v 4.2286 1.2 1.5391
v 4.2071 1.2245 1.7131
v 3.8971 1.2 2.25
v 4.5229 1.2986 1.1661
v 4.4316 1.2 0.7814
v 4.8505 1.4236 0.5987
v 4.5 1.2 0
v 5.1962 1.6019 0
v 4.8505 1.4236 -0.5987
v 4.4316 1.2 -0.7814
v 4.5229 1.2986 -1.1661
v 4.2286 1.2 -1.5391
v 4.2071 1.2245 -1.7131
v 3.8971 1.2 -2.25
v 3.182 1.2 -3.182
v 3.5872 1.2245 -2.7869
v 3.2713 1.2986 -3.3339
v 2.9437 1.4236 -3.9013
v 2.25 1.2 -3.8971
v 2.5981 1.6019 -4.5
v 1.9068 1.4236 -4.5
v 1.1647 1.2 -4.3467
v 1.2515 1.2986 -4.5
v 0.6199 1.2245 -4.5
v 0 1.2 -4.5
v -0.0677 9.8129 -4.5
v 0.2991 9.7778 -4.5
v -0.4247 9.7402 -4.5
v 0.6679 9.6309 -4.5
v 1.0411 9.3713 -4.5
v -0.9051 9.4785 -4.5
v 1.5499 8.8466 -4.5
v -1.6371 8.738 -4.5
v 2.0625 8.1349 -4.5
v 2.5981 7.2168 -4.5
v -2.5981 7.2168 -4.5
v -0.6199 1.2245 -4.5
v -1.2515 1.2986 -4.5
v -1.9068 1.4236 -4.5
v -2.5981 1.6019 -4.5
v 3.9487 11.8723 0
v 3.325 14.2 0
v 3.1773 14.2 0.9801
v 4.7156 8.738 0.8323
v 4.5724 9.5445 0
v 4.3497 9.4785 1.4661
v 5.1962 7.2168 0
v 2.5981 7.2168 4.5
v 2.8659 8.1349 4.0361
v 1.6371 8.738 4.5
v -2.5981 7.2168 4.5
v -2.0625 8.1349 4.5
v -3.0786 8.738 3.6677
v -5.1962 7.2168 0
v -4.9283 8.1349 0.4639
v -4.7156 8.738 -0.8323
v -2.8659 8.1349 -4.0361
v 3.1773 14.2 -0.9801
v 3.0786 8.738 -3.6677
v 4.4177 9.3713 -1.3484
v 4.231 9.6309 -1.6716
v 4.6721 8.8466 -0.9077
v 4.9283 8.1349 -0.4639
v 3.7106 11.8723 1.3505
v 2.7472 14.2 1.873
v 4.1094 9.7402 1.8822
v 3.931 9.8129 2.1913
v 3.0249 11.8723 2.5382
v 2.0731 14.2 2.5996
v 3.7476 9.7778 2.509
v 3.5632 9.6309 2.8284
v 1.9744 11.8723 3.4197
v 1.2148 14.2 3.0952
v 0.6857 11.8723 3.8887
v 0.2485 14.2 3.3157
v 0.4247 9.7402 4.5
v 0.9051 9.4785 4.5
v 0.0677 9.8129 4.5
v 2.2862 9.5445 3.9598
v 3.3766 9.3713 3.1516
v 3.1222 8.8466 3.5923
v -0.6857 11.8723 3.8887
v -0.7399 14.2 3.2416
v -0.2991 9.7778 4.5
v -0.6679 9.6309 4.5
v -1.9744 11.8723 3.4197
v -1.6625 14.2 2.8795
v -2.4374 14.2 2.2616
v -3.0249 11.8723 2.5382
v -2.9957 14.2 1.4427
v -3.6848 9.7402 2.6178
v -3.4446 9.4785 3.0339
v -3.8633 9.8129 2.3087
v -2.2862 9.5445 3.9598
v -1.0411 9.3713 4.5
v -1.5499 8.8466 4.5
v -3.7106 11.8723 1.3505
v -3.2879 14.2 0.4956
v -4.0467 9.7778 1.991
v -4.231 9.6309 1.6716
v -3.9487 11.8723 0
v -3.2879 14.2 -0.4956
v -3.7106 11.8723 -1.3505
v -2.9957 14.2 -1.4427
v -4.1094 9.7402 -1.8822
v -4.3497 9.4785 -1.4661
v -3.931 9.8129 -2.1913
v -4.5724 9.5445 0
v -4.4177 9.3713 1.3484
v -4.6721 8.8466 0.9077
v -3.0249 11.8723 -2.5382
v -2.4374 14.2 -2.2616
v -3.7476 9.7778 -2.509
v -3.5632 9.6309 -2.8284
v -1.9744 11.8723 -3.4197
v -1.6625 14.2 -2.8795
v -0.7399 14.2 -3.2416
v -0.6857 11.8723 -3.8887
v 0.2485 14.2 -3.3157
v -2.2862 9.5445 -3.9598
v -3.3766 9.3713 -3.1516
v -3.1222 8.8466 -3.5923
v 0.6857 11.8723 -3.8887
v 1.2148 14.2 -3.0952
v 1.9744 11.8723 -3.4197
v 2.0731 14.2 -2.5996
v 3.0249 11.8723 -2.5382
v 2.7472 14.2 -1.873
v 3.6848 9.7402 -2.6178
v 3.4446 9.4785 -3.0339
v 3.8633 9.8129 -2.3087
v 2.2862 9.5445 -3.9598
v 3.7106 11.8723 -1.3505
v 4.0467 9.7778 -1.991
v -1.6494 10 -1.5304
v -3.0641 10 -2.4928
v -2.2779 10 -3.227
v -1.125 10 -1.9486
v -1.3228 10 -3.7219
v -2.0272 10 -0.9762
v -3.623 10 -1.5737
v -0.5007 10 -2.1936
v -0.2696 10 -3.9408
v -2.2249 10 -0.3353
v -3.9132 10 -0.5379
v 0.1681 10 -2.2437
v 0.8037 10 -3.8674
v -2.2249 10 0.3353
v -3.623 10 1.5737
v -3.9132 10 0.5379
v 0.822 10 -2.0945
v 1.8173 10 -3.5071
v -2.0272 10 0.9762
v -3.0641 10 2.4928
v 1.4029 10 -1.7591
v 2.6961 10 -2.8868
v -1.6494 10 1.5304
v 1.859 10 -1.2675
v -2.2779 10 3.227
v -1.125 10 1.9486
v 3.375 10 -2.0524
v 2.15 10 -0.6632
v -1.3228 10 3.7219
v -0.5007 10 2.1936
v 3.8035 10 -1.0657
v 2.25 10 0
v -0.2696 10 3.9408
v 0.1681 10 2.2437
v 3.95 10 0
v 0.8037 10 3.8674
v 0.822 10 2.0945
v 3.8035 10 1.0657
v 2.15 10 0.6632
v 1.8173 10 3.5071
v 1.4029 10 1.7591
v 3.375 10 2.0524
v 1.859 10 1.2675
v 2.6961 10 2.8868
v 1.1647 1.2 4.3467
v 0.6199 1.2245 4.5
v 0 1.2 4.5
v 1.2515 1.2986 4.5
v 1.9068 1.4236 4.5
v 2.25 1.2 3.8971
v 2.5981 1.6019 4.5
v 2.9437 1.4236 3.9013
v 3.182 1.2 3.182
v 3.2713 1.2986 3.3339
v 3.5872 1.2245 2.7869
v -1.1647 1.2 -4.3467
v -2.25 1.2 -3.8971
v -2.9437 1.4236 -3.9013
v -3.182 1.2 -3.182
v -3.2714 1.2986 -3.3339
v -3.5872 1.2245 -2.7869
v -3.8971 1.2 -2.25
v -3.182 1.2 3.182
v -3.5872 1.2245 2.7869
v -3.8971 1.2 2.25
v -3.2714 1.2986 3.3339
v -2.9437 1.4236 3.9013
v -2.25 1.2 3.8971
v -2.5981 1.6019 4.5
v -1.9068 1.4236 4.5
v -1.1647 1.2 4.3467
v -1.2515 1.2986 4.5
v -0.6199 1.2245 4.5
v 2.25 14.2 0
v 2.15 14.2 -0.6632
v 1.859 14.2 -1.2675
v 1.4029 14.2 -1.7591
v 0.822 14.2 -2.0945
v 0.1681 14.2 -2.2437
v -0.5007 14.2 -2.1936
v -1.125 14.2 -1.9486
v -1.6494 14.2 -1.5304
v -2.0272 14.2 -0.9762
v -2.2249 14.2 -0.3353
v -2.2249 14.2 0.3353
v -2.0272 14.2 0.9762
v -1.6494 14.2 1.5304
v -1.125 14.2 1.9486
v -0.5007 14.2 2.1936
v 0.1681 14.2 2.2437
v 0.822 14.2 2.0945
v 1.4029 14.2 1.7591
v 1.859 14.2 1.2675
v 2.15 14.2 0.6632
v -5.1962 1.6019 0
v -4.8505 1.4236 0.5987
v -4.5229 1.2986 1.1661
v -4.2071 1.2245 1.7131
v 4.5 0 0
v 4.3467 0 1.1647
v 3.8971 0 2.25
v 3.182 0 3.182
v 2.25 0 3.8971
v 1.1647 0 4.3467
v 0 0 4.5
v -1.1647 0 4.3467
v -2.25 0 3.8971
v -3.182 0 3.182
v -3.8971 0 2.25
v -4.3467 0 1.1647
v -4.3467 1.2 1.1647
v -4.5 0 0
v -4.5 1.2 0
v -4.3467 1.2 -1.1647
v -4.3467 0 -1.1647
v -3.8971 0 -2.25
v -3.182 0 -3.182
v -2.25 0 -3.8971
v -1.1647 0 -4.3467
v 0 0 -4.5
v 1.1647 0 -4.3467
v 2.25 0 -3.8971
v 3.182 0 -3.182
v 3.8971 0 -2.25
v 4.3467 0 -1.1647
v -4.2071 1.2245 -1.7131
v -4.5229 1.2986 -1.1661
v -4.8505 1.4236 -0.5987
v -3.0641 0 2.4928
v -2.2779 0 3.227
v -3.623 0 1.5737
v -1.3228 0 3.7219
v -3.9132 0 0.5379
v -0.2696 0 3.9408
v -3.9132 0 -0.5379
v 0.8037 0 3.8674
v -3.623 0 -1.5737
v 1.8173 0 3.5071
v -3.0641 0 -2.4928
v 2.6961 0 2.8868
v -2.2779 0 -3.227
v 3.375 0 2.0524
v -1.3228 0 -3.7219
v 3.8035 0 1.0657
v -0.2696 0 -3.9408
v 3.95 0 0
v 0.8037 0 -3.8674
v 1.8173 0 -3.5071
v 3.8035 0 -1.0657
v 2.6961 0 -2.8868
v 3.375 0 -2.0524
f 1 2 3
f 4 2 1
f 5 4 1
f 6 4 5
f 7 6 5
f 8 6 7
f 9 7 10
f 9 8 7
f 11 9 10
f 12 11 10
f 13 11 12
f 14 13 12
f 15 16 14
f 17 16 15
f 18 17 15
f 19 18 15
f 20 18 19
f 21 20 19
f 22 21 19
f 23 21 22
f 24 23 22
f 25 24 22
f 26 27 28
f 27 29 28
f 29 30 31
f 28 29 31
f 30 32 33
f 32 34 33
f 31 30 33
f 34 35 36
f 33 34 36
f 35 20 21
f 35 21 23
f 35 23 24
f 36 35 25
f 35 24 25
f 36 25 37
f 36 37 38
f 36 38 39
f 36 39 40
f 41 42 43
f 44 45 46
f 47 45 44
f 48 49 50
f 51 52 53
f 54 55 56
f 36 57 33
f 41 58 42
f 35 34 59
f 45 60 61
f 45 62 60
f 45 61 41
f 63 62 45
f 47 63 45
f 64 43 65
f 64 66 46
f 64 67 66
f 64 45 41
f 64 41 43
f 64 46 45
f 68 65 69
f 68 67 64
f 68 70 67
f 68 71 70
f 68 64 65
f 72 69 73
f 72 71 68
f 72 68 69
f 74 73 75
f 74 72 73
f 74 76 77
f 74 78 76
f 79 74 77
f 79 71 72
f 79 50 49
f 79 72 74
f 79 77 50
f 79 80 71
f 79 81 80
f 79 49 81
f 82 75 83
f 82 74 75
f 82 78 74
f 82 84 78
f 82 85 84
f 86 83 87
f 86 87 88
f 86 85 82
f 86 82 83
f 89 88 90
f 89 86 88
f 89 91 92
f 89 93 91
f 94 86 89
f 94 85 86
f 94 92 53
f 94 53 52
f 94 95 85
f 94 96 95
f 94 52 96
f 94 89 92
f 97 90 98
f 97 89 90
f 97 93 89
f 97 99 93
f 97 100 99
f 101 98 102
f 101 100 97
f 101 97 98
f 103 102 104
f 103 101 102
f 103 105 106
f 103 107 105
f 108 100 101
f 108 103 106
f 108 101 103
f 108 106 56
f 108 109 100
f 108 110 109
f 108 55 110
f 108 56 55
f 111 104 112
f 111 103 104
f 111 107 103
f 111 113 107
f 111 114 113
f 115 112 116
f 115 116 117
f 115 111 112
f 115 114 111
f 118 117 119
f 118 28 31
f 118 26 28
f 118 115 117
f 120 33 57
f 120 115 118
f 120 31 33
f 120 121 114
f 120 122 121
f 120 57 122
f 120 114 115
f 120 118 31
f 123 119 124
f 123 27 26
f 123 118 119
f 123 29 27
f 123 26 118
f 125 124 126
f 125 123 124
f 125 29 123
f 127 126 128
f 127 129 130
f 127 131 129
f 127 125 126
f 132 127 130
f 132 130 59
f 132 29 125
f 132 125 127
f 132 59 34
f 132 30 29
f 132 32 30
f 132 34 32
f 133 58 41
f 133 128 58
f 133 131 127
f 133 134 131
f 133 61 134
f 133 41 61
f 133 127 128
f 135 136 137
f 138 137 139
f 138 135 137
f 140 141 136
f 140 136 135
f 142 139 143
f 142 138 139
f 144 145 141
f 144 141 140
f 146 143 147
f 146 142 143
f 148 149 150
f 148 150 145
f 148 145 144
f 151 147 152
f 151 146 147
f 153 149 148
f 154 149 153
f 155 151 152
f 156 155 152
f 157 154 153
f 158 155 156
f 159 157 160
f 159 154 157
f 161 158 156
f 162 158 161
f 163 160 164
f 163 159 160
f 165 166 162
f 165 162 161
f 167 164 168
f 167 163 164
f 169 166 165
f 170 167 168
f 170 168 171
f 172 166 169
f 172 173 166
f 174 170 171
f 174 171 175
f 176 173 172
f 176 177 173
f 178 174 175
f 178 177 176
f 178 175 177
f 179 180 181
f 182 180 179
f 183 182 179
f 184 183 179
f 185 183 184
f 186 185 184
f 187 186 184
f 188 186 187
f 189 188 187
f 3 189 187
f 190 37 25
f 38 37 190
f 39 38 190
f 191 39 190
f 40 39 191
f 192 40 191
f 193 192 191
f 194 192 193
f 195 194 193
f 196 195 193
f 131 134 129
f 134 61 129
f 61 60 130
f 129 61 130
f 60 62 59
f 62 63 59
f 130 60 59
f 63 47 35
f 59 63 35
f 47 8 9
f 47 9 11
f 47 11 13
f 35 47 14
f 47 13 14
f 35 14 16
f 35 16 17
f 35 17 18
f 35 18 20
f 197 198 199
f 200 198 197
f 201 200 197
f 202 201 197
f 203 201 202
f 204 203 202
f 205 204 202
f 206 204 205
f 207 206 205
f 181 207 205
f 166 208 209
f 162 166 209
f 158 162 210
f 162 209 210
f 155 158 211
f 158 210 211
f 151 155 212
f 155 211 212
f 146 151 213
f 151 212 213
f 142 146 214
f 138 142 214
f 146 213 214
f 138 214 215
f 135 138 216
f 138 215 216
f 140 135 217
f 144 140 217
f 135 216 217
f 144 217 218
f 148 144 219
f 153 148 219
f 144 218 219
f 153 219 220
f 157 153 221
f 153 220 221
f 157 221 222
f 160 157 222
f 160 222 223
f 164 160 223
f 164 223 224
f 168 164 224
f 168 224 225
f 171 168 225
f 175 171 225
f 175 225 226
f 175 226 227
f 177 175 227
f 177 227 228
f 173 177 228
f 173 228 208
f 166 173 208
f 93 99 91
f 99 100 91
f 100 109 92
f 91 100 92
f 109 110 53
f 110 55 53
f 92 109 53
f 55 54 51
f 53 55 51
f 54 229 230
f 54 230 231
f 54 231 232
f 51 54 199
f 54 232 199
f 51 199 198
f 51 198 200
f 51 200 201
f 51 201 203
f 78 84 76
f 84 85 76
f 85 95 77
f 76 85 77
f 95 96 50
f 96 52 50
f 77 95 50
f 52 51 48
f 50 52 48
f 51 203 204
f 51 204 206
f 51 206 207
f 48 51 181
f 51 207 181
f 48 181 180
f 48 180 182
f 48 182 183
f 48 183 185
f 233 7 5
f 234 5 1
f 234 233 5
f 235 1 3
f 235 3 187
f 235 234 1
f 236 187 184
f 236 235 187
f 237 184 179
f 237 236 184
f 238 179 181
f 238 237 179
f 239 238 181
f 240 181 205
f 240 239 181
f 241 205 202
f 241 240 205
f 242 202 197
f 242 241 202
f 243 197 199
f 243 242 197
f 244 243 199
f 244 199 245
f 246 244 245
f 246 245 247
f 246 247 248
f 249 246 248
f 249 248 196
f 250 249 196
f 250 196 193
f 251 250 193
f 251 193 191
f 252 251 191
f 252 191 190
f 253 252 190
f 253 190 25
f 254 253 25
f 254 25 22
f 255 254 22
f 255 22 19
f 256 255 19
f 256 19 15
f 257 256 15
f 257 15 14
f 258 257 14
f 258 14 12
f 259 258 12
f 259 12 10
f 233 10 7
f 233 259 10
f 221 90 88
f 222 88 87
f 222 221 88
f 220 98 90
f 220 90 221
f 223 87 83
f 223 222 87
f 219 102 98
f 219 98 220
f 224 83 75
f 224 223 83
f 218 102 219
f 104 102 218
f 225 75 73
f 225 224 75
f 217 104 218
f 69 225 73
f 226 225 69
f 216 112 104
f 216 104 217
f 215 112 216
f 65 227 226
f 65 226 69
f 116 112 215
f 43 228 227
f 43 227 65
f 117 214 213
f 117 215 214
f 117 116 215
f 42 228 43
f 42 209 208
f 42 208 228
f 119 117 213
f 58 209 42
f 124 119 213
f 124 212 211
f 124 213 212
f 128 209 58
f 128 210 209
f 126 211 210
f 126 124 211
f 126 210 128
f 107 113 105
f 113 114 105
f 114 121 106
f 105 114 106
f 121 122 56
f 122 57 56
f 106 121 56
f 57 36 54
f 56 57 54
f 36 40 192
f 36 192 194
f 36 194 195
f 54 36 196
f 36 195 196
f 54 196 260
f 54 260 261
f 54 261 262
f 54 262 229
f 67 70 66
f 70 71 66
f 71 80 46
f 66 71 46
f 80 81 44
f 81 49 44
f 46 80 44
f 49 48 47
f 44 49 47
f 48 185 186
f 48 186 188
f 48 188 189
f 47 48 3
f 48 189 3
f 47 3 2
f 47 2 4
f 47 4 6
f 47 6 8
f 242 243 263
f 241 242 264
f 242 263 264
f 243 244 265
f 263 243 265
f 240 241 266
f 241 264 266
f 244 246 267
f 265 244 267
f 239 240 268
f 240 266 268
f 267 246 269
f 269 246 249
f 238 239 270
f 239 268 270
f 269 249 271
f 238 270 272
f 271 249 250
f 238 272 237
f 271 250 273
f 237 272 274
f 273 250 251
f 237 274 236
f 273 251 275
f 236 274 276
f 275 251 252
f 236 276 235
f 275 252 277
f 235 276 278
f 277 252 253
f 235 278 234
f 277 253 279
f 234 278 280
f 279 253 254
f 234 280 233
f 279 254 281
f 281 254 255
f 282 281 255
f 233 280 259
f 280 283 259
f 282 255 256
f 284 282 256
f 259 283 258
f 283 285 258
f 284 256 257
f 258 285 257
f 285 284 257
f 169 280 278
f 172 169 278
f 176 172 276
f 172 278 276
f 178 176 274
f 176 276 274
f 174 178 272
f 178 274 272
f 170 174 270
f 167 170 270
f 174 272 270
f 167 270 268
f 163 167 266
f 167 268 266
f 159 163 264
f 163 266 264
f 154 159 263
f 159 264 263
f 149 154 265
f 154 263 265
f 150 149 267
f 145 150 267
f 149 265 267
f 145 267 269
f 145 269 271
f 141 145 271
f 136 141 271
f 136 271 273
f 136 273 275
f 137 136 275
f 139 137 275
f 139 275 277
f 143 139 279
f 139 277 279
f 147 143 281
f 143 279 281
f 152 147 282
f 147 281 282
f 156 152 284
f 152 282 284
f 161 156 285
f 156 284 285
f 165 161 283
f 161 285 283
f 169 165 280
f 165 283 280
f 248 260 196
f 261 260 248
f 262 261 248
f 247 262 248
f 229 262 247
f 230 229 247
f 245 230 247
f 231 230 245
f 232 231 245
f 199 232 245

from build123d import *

# Parameters (mm, degrees)
BOSS_EXTRUDE1_DEPTH = 14.2
SKETCH2_R           = 2.25
CUT_EXTRUDE1_DEPTH  = 15.2
SKETCH3_R           = 3.95
CUT_EXTRUDE2_DEPTH  = 10
SKETCH4_OUTSIDE_W   = 21.704
SKETCH4_OUTSIDE_H   = 20.312
SKETCH4_OUTSIDE_R   = 3.325
CUT_EXTRUDE3_DEPTH  = 10
CUT_EXTRUDE3_TAPER  = 15
SKETCH5_OUTSIDE_W   = 16.344
SKETCH5_OUTSIDE_H   = 14.952
SKETCH5_OUTSIDE_R   = 4.5
CUT_EXTRUDE4_DEPTH  = 1.2
SKETCH6_OUTSIDE_W   = 50.986
SKETCH6_OUTSIDE_H   = 49.594
SKETCH6_OUTSIDE_R   = 4.5
CUT_EXTRUDE5_DEPTH  = 10
CUT_EXTRUDE5_TAPER  = 60


with BuildPart() as part:
    # Sketch1 → Boss-Extrude1 (new body)
    with BuildSketch(Plane(origin=(0, 0, 0), x_dir=(1, 0, 0), z_dir=(0, 1, 0))):
        Polygon((-2.598076211, -4.5), (2.598076211, -4.5), (5.196152423, 0), (2.598076211, 4.5), (-2.598076211, 4.5), (-5.196152423, 0), align=None)
    extrude(amount=BOSS_EXTRUDE1_DEPTH)

    # Sketch2 → Cut-Extrude1 (cut, through all)
    with BuildSketch(Plane(origin=(0, 14.2, 0), x_dir=(1, 0, 0), z_dir=(0, 1, 0))):
        Circle(SKETCH2_R)
    extrude(amount=-CUT_EXTRUDE1_DEPTH, mode=Mode.SUBTRACT)

    # Sketch3 → Cut-Extrude2 (cut)
    with BuildSketch(Plane.XZ):
        Circle(SKETCH3_R)
    extrude(amount=-CUT_EXTRUDE2_DEPTH, mode=Mode.SUBTRACT)

    # Sketch4 outside → Cut-Extrude3 (cut)
    with BuildSketch(Plane(origin=(0, 14.2, 0), x_dir=(1, 0, 0), z_dir=(0, 1, 0))):
        Rectangle(SKETCH4_OUTSIDE_W, SKETCH4_OUTSIDE_H)
        Circle(SKETCH4_OUTSIDE_R, mode=Mode.SUBTRACT)
    extrude(amount=-CUT_EXTRUDE3_DEPTH, taper=CUT_EXTRUDE3_TAPER, mode=Mode.SUBTRACT)

    # Sketch5 outside → Cut-Extrude4 (cut)
    with BuildSketch(Plane.XZ):
        Rectangle(SKETCH5_OUTSIDE_W, SKETCH5_OUTSIDE_H)
        Circle(SKETCH5_OUTSIDE_R, mode=Mode.SUBTRACT)
    extrude(amount=-CUT_EXTRUDE4_DEPTH, mode=Mode.SUBTRACT)

    # Sketch6 outside → Cut-Extrude5 (cut)
    with BuildSketch(Plane.XZ.offset(-1.2)):
        Rectangle(SKETCH6_OUTSIDE_W, SKETCH6_OUTSIDE_H)
        Circle(SKETCH6_OUTSIDE_R, mode=Mode.SUBTRACT)
    extrude(amount=-CUT_EXTRUDE5_DEPTH, taper=CUT_EXTRUDE5_TAPER, mode=Mode.SUBTRACT)


solid = part.part
